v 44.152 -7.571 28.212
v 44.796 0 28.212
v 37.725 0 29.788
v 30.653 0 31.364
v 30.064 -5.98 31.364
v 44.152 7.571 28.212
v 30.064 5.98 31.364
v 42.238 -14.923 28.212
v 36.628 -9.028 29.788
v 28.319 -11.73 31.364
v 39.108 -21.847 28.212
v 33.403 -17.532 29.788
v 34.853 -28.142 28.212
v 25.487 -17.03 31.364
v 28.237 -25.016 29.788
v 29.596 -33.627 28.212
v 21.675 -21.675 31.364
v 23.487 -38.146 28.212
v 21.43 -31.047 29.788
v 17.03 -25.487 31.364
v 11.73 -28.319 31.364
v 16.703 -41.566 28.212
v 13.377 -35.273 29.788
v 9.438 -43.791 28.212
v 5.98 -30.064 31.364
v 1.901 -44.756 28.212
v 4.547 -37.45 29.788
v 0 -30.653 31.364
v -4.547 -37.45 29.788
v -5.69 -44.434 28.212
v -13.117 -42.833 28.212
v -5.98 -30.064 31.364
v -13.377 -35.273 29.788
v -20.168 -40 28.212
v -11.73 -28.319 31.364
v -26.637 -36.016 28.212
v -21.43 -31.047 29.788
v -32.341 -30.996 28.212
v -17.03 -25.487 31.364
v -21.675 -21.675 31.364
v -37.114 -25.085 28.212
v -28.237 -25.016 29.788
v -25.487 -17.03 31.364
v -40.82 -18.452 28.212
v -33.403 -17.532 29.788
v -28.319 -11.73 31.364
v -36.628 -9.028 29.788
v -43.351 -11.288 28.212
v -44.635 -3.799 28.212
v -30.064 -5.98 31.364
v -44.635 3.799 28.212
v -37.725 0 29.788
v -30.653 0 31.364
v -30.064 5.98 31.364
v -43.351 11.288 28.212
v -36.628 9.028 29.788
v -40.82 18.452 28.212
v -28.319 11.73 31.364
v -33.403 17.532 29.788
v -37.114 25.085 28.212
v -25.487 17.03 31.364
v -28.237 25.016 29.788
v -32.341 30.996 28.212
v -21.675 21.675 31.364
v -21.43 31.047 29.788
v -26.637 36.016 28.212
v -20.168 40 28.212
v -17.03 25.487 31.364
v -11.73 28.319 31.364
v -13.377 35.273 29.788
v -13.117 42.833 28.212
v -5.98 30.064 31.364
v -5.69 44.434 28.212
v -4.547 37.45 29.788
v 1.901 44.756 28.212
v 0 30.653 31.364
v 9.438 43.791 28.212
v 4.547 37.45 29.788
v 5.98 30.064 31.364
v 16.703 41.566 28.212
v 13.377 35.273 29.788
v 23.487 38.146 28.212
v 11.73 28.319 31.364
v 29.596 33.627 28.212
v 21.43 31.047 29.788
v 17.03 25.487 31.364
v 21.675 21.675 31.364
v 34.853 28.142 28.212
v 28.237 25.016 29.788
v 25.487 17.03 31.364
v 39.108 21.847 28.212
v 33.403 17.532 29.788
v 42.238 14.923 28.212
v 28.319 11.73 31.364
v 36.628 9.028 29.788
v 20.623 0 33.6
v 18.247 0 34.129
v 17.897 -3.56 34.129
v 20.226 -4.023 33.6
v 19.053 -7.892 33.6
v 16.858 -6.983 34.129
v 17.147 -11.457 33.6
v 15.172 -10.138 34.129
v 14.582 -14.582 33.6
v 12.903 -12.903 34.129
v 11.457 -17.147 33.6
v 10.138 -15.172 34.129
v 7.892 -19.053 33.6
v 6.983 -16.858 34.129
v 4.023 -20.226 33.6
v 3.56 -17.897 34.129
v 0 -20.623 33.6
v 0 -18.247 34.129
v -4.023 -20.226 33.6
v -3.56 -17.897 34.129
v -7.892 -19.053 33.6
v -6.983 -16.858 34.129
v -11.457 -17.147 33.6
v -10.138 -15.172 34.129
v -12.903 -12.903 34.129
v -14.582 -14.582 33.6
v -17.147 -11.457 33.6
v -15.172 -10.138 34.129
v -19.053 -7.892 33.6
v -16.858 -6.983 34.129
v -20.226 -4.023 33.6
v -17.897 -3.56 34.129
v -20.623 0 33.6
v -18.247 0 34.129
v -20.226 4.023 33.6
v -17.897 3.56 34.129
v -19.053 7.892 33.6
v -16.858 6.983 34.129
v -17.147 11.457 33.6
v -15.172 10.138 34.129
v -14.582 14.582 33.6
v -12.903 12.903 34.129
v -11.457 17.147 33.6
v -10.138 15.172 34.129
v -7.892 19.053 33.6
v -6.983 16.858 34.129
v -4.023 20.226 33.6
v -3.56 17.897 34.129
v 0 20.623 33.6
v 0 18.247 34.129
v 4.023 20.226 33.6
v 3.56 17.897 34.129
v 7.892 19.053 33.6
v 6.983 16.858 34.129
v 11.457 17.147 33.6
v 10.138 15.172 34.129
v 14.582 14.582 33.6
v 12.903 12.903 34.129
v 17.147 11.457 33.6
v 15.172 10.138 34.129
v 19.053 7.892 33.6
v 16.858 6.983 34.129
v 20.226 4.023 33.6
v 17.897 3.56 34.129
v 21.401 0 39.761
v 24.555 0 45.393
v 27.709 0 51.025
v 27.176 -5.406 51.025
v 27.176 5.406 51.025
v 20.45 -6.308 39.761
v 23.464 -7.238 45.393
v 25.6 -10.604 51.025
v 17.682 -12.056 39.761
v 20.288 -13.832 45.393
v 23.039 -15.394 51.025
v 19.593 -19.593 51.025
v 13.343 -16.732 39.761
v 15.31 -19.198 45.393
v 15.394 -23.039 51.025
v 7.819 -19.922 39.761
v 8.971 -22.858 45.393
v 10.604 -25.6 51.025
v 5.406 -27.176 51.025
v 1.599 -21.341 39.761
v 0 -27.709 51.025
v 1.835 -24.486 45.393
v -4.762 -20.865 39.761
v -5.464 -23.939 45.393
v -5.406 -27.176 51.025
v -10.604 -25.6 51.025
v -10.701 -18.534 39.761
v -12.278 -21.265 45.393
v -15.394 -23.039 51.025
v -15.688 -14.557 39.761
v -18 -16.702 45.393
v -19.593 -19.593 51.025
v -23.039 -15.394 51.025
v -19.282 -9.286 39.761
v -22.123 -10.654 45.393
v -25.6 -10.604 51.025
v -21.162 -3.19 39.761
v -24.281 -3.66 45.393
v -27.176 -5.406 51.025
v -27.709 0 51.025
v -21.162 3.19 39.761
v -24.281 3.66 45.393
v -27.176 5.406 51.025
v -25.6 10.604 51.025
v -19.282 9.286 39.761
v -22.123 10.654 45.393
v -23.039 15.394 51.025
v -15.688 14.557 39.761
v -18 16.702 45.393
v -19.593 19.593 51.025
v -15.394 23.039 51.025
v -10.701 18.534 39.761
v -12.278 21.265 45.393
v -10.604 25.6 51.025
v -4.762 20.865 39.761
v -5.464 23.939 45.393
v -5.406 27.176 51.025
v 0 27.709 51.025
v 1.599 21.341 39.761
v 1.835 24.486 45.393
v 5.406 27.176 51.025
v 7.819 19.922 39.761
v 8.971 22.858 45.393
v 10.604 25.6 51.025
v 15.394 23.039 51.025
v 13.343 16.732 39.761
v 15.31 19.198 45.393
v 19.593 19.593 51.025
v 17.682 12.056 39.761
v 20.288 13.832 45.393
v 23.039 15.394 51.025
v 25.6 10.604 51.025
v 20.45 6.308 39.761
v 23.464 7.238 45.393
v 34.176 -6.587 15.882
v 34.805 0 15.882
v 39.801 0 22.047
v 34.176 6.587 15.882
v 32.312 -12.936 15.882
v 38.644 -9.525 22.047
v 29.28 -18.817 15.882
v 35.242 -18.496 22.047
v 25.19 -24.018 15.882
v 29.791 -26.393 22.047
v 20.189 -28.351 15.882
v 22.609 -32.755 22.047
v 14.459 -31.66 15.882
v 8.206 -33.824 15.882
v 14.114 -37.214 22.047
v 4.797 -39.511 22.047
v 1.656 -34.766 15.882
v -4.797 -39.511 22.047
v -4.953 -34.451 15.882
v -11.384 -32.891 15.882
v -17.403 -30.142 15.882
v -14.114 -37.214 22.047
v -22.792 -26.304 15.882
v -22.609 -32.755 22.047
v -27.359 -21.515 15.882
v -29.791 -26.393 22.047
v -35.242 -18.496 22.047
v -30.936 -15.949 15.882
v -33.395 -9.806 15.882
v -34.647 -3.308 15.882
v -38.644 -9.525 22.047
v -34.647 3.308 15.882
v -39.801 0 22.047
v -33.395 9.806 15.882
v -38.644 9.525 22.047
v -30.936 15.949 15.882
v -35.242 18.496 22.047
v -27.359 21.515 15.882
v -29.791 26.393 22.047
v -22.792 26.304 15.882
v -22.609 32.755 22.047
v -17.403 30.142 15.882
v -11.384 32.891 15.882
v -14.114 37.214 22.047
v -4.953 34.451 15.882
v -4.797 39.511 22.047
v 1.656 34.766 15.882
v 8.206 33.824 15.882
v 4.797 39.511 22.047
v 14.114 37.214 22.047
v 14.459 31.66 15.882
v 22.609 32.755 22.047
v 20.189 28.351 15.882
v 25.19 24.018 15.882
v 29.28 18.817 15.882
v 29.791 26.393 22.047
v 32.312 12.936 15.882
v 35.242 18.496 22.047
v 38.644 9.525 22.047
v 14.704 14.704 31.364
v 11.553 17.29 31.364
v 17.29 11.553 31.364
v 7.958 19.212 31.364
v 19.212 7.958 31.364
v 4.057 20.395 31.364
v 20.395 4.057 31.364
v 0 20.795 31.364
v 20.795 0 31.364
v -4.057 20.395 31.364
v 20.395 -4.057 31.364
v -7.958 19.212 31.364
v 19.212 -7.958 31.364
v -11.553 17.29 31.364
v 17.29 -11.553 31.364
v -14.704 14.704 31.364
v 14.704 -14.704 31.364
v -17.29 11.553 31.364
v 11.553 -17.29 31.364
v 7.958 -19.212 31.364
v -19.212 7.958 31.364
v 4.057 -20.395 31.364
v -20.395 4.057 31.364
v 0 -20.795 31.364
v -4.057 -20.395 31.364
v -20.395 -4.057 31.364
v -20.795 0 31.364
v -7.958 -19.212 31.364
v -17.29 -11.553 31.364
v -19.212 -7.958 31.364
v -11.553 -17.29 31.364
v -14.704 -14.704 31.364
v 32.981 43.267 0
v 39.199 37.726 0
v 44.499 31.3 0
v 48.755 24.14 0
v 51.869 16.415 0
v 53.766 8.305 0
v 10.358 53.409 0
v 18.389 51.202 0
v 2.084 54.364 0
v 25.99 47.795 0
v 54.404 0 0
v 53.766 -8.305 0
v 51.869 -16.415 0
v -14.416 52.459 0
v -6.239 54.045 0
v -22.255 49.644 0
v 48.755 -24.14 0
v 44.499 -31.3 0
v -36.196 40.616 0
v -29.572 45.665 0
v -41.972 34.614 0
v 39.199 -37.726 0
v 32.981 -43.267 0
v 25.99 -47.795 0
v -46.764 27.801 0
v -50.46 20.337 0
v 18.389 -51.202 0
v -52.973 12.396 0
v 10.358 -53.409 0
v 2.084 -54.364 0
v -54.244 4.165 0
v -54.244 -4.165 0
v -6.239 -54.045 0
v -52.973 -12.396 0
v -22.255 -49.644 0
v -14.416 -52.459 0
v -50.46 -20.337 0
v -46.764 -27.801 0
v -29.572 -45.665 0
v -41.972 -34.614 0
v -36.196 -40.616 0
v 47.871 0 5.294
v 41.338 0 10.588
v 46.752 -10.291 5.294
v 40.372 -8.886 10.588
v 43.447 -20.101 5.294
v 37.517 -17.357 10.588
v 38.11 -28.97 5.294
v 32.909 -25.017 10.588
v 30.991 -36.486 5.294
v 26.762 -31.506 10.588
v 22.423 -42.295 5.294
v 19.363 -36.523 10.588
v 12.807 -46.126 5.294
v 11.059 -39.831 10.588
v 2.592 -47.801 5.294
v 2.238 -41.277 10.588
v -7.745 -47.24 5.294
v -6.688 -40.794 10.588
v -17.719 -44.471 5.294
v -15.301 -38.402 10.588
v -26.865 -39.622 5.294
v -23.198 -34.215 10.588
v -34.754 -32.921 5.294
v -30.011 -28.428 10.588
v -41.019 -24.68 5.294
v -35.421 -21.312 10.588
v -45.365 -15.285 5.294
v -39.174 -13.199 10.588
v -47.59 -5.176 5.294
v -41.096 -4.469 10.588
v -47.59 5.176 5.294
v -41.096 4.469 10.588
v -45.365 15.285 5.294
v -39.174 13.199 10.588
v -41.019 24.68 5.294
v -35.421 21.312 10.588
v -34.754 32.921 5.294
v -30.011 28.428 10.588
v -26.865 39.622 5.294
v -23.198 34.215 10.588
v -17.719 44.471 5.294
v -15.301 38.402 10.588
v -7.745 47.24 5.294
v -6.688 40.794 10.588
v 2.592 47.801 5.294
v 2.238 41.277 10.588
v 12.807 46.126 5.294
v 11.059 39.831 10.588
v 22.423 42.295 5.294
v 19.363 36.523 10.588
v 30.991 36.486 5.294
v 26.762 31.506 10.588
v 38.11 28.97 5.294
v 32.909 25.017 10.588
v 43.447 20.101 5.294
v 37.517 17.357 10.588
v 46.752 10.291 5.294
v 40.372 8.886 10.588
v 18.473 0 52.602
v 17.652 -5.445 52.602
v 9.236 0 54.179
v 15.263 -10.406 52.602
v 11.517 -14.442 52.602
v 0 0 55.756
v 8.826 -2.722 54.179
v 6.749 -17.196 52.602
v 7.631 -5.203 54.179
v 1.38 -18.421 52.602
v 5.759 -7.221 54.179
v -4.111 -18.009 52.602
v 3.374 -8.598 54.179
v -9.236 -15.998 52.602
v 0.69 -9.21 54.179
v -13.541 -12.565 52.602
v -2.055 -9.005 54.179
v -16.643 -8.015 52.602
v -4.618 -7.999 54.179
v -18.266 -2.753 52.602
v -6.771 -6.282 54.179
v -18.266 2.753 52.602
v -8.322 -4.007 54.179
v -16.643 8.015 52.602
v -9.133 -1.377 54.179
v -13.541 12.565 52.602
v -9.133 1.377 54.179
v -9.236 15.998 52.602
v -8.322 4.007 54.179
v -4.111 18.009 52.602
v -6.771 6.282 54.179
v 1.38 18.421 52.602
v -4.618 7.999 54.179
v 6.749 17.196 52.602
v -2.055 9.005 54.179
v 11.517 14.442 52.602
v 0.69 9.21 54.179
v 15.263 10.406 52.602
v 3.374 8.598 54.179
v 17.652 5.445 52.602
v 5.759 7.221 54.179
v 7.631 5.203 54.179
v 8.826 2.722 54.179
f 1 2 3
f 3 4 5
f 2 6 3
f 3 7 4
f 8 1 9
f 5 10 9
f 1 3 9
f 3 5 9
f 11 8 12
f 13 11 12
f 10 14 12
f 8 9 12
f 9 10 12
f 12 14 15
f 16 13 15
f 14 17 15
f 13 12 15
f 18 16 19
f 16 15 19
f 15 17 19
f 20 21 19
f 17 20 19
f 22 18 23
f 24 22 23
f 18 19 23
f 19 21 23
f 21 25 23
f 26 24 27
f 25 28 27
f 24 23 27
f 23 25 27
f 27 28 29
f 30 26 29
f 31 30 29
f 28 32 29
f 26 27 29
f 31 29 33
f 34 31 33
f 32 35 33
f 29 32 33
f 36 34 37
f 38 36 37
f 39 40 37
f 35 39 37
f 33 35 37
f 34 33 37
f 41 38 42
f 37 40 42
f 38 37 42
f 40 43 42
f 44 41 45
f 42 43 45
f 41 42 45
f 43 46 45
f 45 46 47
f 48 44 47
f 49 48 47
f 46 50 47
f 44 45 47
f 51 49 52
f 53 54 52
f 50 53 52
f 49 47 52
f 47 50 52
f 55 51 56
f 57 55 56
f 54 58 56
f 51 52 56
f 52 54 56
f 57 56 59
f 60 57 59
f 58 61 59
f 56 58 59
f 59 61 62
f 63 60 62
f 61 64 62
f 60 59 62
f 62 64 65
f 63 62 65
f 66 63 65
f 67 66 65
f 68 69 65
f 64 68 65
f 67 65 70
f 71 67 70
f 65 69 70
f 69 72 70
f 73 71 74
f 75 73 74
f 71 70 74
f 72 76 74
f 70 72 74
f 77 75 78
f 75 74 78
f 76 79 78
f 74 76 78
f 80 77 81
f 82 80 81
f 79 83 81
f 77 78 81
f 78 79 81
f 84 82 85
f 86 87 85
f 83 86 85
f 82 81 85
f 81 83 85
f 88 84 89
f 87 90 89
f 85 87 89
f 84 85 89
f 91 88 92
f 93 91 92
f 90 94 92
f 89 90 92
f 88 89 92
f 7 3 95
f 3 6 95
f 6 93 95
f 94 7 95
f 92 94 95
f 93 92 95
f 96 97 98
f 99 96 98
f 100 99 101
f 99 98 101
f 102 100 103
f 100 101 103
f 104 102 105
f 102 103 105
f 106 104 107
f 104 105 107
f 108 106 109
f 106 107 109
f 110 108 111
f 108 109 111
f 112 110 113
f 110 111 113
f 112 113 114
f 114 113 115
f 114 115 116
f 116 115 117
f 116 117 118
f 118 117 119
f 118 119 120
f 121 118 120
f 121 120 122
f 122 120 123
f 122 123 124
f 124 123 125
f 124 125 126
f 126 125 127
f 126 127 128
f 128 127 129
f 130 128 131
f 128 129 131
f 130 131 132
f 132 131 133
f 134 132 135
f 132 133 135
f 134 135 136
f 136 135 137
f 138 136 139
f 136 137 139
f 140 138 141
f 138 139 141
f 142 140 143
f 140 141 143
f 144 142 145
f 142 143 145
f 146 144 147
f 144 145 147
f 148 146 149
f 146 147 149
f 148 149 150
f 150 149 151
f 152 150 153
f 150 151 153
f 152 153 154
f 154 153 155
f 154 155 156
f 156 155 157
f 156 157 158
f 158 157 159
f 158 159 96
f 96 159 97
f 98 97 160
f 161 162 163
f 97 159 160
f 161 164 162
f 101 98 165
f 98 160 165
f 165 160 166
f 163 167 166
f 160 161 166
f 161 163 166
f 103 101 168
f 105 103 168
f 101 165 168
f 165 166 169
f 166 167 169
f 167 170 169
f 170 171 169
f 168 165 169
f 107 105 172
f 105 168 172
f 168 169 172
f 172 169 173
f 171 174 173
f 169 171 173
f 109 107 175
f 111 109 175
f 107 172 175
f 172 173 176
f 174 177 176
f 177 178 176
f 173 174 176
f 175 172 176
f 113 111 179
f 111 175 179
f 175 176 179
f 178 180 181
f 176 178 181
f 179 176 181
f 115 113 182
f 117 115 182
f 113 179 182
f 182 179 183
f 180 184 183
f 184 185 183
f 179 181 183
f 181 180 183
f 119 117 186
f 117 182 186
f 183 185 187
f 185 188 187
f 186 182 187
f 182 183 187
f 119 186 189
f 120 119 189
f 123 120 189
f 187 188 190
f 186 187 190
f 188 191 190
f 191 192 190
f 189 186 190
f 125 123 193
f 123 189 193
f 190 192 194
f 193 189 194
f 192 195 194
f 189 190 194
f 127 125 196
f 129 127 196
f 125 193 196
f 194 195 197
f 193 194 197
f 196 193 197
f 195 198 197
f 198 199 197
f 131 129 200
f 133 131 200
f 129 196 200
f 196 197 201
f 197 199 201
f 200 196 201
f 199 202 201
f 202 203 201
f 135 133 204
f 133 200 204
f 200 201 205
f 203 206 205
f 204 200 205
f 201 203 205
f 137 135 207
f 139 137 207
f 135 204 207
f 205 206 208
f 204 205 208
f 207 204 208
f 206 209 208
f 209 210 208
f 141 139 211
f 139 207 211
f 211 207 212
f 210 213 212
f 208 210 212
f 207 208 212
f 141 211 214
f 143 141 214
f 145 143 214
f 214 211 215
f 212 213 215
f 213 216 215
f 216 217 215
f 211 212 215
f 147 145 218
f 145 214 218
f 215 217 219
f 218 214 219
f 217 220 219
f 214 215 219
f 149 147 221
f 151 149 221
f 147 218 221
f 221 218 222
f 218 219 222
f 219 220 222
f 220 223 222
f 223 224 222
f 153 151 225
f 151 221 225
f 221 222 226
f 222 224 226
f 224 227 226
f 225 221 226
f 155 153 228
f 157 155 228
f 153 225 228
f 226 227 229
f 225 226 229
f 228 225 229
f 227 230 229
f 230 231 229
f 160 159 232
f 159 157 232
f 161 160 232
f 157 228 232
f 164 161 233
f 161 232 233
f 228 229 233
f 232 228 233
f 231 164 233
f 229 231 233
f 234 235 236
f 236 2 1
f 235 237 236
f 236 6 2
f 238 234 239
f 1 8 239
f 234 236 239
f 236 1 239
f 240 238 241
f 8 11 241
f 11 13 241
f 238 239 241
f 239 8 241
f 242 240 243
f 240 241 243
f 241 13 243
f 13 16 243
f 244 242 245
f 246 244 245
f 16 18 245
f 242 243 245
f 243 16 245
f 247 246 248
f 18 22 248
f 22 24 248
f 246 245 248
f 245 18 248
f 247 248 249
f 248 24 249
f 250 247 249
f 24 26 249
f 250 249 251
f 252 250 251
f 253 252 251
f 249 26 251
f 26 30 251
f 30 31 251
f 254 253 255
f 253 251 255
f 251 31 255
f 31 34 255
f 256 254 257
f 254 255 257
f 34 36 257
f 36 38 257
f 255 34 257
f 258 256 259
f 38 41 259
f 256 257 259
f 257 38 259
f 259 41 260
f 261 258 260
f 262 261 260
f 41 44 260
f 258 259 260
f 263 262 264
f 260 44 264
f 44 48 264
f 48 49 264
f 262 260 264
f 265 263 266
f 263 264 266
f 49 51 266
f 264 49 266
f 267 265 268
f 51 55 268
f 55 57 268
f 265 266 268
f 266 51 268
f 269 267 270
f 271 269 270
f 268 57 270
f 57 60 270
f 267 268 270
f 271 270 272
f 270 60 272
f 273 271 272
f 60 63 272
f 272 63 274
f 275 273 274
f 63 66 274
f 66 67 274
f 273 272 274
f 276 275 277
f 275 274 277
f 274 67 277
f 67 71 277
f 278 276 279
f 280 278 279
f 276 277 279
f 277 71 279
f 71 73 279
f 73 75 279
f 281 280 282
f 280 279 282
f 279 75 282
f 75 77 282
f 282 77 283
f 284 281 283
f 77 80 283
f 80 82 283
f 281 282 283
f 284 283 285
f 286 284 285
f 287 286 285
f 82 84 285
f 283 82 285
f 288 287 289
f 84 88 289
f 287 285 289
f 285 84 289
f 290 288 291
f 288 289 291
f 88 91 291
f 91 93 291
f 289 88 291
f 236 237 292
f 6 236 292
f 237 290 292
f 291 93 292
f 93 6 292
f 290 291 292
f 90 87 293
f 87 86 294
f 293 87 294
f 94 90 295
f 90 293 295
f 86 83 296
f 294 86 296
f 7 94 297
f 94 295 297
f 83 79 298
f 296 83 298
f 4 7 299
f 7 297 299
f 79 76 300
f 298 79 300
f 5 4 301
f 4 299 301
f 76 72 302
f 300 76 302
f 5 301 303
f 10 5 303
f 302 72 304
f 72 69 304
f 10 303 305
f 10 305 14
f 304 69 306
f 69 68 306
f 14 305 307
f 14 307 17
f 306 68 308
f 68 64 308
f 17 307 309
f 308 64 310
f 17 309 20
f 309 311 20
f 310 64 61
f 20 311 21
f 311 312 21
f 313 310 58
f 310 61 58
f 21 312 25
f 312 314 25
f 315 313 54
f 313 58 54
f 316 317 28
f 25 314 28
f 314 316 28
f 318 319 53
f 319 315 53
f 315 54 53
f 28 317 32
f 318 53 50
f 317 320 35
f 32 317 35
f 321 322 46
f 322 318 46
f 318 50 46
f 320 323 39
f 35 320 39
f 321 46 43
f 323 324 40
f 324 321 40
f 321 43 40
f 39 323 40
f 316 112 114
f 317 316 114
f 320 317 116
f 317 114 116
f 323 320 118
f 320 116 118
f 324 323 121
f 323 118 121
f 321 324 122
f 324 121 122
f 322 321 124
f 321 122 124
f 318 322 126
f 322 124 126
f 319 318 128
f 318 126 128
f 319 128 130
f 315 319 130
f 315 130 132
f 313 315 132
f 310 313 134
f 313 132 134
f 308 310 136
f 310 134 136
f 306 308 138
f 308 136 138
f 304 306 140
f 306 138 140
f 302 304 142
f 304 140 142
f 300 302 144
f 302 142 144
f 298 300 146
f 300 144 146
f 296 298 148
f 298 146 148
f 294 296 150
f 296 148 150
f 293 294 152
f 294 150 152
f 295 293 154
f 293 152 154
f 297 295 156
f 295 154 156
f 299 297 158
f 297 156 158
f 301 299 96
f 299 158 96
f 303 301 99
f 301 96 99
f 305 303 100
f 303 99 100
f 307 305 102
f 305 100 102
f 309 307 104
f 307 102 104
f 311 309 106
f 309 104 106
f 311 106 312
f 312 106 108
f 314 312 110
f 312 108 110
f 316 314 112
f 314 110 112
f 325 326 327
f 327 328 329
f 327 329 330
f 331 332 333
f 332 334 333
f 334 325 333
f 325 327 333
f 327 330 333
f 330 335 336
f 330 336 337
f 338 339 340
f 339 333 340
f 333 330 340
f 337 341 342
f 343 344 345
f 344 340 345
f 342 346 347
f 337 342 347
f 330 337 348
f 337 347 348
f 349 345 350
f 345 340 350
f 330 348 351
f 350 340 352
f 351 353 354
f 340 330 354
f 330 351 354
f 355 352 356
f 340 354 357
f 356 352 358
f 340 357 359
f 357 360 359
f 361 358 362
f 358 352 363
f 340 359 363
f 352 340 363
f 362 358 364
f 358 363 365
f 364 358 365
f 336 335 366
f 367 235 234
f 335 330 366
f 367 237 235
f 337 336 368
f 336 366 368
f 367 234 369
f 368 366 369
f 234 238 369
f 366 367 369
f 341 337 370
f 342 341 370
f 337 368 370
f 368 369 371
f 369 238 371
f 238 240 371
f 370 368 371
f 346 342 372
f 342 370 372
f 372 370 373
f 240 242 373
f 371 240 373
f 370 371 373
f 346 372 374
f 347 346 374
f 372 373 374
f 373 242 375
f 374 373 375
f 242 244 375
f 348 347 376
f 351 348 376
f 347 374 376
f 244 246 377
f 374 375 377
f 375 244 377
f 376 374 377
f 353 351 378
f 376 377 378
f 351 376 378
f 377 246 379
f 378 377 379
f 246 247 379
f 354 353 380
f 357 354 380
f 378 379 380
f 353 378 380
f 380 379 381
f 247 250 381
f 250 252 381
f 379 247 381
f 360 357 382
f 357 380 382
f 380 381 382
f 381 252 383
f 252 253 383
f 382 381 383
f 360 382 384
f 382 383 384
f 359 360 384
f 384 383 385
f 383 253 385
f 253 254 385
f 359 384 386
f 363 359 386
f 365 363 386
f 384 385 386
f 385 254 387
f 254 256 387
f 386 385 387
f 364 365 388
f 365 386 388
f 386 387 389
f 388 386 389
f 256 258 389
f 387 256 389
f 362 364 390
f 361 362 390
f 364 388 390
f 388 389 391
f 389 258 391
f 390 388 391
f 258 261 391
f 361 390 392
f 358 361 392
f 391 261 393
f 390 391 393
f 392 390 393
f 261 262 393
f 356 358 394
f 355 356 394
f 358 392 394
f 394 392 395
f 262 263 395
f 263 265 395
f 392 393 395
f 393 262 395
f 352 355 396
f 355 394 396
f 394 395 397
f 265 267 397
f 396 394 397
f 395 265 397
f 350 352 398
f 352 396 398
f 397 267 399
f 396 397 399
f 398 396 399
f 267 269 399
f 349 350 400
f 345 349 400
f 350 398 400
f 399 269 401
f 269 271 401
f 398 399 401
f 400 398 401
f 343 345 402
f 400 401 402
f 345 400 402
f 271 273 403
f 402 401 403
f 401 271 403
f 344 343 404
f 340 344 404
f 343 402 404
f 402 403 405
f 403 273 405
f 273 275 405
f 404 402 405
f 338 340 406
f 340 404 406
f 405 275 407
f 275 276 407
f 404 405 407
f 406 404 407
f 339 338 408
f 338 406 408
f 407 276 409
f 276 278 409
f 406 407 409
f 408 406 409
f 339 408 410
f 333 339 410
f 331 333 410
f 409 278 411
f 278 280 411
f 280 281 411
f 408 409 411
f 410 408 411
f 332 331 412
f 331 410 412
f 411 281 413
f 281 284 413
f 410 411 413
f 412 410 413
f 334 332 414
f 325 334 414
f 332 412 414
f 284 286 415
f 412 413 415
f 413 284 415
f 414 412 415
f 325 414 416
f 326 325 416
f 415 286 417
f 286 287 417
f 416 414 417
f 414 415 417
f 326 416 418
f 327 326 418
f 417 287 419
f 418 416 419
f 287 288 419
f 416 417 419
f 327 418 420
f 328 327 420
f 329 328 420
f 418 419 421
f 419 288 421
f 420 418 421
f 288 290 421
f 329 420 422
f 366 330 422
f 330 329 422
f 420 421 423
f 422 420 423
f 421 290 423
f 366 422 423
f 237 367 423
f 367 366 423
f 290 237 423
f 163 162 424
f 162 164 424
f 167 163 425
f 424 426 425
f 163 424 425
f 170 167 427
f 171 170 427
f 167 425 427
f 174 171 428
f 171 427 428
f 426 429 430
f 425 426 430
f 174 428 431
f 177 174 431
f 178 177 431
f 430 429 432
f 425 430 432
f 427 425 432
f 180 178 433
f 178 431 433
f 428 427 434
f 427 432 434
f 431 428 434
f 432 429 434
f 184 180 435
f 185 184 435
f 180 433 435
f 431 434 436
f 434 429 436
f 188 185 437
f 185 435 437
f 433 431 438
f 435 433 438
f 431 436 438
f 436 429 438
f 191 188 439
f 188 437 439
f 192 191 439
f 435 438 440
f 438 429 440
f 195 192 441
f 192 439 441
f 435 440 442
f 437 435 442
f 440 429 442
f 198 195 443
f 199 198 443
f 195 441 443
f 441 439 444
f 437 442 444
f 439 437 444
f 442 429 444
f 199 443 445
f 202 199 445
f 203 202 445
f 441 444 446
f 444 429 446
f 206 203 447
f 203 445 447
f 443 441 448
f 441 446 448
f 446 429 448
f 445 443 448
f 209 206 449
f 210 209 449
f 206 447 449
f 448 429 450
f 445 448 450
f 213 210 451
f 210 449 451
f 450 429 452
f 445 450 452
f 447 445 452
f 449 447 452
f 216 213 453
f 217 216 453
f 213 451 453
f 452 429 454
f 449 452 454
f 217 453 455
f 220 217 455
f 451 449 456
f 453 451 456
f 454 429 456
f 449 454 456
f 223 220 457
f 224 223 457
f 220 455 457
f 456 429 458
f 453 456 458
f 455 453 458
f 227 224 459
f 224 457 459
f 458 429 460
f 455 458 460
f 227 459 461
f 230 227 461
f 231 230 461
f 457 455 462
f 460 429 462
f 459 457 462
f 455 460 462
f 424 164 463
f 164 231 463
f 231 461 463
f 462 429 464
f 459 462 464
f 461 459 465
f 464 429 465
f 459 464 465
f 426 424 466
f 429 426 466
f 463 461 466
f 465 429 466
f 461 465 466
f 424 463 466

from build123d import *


with BuildPart() as f1:
    # F0 (on Front) → F1 (revolve)
    with BuildSketch(Plane.XZ):
        Polygon((27.708905, 51.024929), (0, 55.75572), (0, 0), (54.404069, 0), (34.805086, 15.881931), (44.796481, 28.211742), (18.247325, 34.129258), align=None)
    revolve(axis=Axis((0, 0, 27.87786), (0, 0, -1)))

    # F2 (on Right) → F3 (revolve, cut)
    with BuildSketch(Plane.YZ):
        Polygon((-20.794654, 31.364221), (-20.621512, 33.615056), (-31.009976, 31.364221), align=None)
    revolve(axis=Axis((0, 0, 28.211742), (0, 0, -1)), mode=Mode.SUBTRACT)


solid = f1.part
